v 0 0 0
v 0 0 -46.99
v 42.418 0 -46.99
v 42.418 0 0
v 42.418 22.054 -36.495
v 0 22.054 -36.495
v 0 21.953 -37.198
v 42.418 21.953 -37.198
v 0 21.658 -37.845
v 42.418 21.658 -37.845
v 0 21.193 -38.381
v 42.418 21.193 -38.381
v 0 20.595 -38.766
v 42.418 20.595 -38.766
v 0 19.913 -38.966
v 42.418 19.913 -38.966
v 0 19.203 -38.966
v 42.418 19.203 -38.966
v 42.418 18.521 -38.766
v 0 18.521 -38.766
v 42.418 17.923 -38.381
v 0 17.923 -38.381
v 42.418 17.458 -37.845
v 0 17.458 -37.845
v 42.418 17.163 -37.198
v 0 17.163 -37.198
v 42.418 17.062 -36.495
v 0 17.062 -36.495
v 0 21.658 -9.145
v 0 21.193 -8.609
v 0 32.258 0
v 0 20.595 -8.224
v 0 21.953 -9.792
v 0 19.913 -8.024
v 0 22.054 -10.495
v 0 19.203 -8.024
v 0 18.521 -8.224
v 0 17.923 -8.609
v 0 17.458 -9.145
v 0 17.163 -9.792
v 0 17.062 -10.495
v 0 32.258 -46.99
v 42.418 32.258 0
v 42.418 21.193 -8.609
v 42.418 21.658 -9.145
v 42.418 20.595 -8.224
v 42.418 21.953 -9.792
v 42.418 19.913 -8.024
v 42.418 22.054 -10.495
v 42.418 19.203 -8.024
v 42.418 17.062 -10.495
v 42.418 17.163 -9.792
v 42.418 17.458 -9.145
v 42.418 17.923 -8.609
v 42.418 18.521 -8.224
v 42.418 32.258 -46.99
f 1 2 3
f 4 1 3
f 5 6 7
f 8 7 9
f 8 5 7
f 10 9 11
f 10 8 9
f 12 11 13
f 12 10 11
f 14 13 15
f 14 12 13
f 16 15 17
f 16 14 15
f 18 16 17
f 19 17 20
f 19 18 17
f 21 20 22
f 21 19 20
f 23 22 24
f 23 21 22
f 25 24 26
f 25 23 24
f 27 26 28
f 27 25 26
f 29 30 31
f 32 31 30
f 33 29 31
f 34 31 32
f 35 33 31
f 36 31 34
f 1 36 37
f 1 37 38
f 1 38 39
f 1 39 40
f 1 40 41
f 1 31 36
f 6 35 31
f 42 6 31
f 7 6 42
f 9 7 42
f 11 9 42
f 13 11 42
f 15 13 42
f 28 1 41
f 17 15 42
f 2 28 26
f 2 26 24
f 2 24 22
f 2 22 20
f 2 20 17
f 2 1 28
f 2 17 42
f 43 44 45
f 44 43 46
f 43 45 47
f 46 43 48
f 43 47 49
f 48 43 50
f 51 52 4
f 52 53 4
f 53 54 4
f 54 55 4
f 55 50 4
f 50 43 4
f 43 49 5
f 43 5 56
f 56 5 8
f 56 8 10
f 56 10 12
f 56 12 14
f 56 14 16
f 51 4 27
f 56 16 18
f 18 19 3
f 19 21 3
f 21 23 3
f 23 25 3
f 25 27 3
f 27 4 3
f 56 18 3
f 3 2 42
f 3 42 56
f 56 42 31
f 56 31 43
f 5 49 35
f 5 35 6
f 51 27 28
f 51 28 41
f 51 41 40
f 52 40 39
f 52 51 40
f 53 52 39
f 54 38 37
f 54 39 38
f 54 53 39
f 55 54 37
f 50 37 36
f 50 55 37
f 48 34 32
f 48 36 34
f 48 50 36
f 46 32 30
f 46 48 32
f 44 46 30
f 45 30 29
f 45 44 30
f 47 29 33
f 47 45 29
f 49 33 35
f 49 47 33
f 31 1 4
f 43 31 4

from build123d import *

# Parameters (mm, degrees)
SKETCH1_W           = 42.418
SKETCH1_H           = 46.99
BOSS_EXTRUDE1_DEPTH = 32.258
CUT_EXTRUDE1_DEPTH  = 43.418


with BuildPart() as part:
    # Sketch1 → Boss-Extrude1 (new body)
    with BuildSketch(Plane(origin=(0, 0, 0), x_dir=(1, 0, 0), z_dir=(0, 1, 0))):
        with Locations((21.209, 23.495)):
            Rectangle(SKETCH1_W, SKETCH1_H)
    extrude(amount=BOSS_EXTRUDE1_DEPTH)

    # Sketch2 → Cut-Extrude1 (cut, through all)
    with BuildSketch(Plane(origin=(42.418, 0, 0), x_dir=(0, 0, -1), z_dir=(1, 0, 0))):
        with BuildLine():
            Line((10.495, 22.054113), (36.495, 22.054113))
            ThreePointArc((36.495, 22.054113), (38.991113, 19.558), (36.495, 17.061887))
            Line((36.495, 17.061887), (10.495, 17.061887))
            ThreePointArc((10.495, 17.061887), (7.998887, 19.558), (10.495, 22.054113))
        make_face()
    extrude(amount=-CUT_EXTRUDE1_DEPTH, mode=Mode.SUBTRACT)


solid = part.part
